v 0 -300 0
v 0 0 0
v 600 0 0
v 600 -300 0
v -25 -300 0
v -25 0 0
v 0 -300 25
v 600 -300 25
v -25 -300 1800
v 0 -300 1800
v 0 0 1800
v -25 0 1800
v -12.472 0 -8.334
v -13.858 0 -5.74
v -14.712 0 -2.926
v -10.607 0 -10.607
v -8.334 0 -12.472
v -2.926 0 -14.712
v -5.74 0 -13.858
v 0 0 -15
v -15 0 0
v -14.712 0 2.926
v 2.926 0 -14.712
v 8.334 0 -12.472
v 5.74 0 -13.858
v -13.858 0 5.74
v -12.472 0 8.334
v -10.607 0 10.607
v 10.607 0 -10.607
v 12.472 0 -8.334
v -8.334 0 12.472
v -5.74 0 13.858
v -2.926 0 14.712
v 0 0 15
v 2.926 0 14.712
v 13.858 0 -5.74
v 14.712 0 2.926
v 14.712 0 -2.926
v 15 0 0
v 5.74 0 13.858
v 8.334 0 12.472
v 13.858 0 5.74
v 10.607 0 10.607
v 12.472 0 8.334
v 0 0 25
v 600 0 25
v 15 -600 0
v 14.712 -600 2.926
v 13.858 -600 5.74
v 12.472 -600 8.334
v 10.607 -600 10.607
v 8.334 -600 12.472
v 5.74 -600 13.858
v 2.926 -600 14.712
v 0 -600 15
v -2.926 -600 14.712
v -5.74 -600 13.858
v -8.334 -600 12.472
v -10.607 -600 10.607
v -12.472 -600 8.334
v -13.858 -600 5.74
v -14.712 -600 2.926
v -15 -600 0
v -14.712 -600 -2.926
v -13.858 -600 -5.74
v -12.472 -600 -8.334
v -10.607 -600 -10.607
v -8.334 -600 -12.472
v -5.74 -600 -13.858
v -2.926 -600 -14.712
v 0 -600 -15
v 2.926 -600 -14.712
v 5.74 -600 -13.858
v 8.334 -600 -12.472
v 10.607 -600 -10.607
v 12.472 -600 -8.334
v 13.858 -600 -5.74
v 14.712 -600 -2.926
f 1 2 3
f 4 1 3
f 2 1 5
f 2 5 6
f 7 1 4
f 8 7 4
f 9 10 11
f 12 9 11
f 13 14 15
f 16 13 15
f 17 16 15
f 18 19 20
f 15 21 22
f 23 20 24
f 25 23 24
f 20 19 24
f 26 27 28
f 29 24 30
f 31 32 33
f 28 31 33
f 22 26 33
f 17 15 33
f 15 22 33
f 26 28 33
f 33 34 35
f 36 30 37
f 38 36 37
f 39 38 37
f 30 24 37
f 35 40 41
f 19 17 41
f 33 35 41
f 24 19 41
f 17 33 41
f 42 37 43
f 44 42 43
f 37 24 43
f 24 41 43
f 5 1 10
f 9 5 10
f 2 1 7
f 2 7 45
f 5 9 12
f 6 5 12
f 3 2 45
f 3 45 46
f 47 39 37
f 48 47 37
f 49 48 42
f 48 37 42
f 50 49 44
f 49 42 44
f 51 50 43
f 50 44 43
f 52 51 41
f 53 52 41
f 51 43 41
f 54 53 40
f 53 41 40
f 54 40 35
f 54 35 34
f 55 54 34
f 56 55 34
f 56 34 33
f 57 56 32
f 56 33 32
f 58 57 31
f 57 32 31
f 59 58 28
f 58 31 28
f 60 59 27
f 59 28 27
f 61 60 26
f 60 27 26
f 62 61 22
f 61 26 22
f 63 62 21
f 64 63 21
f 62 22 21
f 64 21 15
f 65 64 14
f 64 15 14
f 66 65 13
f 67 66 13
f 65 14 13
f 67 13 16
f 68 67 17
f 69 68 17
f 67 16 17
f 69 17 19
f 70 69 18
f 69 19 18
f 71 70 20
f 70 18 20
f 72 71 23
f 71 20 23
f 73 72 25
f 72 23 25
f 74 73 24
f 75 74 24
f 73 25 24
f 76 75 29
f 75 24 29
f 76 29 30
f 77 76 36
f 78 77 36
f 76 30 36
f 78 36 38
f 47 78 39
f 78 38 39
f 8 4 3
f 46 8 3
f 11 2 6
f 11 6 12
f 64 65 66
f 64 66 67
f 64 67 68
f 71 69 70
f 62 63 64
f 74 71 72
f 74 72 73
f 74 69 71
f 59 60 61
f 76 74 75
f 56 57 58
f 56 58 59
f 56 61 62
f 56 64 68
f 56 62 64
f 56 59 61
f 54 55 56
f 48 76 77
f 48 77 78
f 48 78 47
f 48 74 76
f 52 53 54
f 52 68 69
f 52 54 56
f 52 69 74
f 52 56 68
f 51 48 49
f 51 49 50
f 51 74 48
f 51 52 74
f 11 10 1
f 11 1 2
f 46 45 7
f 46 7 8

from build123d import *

# Parameters (mm, degrees)
F0_W     = 600
F0_H     = 300
F1_DEPTH = 25
F2_W     = 300
F2_H     = 1800
F3_DEPTH = 25
F4_R     = 15
F5_DEPTH = 600


with BuildPart() as f1:
    # F0 (on Top) → F1 (new body)
    with BuildSketch(Plane.XY):
        with Locations((300, -150)):
            Rectangle(F0_W, F0_H)
    extrude(amount=F1_DEPTH)


with BuildPart() as f3:
    # F2 (on Right) → F3 (new body)
    with BuildSketch(Plane.YZ):
        with Locations((-150, 900)):
            Rectangle(F2_W, F2_H)
    extrude(amount=-F3_DEPTH)


with BuildPart() as f5:
    # F4 (on Front) → F5 (new body)
    with BuildSketch(Plane.XZ):
        Circle(F4_R)
    extrude(amount=F5_DEPTH)


solid = Compound([f1.part, f3.part, f5.part])
